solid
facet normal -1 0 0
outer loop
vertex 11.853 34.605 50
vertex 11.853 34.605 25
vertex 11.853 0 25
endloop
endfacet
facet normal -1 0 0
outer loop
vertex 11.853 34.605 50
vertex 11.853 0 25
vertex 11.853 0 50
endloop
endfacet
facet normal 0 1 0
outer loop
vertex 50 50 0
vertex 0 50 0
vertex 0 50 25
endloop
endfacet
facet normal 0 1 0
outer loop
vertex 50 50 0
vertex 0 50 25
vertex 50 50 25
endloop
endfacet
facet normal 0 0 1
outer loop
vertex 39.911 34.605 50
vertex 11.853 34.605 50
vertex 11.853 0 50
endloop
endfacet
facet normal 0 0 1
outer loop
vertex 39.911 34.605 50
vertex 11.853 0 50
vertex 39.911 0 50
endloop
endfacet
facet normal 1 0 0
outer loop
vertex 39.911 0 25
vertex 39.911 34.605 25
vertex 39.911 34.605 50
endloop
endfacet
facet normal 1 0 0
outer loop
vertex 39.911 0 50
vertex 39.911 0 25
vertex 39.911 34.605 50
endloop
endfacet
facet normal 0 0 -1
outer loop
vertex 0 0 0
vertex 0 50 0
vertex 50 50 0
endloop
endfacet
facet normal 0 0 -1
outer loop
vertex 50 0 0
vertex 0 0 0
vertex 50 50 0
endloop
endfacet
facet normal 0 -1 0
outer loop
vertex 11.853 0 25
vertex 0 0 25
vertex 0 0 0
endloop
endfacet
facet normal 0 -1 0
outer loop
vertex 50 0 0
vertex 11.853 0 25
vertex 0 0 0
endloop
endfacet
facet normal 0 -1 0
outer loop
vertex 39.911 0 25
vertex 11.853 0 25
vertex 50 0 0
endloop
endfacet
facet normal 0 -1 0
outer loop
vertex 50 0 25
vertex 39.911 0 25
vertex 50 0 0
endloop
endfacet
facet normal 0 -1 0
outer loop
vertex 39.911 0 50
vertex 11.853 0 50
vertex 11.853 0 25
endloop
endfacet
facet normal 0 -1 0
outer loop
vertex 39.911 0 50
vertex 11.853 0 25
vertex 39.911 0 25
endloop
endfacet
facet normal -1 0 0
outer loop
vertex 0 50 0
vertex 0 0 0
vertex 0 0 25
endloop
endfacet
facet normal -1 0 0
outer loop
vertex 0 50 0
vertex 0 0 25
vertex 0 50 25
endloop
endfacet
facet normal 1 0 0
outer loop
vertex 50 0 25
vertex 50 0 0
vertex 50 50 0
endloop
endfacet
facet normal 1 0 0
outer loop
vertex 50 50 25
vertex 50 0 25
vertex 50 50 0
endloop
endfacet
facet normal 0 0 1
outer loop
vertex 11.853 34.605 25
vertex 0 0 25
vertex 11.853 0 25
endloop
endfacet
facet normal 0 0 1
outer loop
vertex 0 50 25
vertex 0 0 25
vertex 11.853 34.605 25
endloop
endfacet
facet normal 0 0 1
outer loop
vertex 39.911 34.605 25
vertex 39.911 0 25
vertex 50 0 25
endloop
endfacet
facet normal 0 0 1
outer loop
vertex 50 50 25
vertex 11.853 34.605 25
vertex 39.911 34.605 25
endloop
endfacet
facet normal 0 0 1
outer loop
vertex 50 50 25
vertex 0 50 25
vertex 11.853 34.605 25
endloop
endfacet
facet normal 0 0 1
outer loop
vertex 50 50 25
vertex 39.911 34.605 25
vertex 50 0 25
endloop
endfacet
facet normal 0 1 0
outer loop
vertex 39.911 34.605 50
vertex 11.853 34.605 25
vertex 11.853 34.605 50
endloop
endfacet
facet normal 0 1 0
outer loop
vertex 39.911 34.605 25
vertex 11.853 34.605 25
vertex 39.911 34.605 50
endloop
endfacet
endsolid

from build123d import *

# Parameters (mm, degrees)
F0_W      = 50
F0_H      = 50
F1_DEPTH  = 25
F2_W      = 28.057508
F2_H      = 20.635585
F3_DEPTH  = 25
F3_FACE_W = 28.057508
F3_FACE_H = 25
F4_DEPTH  = 13.969657


with BuildPart() as f1:
    # F0 (on Top) → F1 (new body)
    with BuildSketch(Plane.XY):
        with Locations((25, 25)):
            Rectangle(F0_W, F0_H)
    extrude(amount=F1_DEPTH)

    # F2 (on face) → F3 (join)
    with BuildSketch(Plane.XY.offset(25)):
        with Locations((25.881764, 24.287449)):
            Rectangle(F2_W, F2_H)
    extrude(amount=F3_DEPTH)

    # F3_face (on face) → F4 (join, through all)
    with BuildSketch(Plane(origin=(25.881764, 13.969657, 37.5), x_dir=(1, 0, 0), z_dir=(0, -1, 0))):
        Rectangle(F3_FACE_W, F3_FACE_H)
    extrude(amount=F4_DEPTH)


solid = f1.part
